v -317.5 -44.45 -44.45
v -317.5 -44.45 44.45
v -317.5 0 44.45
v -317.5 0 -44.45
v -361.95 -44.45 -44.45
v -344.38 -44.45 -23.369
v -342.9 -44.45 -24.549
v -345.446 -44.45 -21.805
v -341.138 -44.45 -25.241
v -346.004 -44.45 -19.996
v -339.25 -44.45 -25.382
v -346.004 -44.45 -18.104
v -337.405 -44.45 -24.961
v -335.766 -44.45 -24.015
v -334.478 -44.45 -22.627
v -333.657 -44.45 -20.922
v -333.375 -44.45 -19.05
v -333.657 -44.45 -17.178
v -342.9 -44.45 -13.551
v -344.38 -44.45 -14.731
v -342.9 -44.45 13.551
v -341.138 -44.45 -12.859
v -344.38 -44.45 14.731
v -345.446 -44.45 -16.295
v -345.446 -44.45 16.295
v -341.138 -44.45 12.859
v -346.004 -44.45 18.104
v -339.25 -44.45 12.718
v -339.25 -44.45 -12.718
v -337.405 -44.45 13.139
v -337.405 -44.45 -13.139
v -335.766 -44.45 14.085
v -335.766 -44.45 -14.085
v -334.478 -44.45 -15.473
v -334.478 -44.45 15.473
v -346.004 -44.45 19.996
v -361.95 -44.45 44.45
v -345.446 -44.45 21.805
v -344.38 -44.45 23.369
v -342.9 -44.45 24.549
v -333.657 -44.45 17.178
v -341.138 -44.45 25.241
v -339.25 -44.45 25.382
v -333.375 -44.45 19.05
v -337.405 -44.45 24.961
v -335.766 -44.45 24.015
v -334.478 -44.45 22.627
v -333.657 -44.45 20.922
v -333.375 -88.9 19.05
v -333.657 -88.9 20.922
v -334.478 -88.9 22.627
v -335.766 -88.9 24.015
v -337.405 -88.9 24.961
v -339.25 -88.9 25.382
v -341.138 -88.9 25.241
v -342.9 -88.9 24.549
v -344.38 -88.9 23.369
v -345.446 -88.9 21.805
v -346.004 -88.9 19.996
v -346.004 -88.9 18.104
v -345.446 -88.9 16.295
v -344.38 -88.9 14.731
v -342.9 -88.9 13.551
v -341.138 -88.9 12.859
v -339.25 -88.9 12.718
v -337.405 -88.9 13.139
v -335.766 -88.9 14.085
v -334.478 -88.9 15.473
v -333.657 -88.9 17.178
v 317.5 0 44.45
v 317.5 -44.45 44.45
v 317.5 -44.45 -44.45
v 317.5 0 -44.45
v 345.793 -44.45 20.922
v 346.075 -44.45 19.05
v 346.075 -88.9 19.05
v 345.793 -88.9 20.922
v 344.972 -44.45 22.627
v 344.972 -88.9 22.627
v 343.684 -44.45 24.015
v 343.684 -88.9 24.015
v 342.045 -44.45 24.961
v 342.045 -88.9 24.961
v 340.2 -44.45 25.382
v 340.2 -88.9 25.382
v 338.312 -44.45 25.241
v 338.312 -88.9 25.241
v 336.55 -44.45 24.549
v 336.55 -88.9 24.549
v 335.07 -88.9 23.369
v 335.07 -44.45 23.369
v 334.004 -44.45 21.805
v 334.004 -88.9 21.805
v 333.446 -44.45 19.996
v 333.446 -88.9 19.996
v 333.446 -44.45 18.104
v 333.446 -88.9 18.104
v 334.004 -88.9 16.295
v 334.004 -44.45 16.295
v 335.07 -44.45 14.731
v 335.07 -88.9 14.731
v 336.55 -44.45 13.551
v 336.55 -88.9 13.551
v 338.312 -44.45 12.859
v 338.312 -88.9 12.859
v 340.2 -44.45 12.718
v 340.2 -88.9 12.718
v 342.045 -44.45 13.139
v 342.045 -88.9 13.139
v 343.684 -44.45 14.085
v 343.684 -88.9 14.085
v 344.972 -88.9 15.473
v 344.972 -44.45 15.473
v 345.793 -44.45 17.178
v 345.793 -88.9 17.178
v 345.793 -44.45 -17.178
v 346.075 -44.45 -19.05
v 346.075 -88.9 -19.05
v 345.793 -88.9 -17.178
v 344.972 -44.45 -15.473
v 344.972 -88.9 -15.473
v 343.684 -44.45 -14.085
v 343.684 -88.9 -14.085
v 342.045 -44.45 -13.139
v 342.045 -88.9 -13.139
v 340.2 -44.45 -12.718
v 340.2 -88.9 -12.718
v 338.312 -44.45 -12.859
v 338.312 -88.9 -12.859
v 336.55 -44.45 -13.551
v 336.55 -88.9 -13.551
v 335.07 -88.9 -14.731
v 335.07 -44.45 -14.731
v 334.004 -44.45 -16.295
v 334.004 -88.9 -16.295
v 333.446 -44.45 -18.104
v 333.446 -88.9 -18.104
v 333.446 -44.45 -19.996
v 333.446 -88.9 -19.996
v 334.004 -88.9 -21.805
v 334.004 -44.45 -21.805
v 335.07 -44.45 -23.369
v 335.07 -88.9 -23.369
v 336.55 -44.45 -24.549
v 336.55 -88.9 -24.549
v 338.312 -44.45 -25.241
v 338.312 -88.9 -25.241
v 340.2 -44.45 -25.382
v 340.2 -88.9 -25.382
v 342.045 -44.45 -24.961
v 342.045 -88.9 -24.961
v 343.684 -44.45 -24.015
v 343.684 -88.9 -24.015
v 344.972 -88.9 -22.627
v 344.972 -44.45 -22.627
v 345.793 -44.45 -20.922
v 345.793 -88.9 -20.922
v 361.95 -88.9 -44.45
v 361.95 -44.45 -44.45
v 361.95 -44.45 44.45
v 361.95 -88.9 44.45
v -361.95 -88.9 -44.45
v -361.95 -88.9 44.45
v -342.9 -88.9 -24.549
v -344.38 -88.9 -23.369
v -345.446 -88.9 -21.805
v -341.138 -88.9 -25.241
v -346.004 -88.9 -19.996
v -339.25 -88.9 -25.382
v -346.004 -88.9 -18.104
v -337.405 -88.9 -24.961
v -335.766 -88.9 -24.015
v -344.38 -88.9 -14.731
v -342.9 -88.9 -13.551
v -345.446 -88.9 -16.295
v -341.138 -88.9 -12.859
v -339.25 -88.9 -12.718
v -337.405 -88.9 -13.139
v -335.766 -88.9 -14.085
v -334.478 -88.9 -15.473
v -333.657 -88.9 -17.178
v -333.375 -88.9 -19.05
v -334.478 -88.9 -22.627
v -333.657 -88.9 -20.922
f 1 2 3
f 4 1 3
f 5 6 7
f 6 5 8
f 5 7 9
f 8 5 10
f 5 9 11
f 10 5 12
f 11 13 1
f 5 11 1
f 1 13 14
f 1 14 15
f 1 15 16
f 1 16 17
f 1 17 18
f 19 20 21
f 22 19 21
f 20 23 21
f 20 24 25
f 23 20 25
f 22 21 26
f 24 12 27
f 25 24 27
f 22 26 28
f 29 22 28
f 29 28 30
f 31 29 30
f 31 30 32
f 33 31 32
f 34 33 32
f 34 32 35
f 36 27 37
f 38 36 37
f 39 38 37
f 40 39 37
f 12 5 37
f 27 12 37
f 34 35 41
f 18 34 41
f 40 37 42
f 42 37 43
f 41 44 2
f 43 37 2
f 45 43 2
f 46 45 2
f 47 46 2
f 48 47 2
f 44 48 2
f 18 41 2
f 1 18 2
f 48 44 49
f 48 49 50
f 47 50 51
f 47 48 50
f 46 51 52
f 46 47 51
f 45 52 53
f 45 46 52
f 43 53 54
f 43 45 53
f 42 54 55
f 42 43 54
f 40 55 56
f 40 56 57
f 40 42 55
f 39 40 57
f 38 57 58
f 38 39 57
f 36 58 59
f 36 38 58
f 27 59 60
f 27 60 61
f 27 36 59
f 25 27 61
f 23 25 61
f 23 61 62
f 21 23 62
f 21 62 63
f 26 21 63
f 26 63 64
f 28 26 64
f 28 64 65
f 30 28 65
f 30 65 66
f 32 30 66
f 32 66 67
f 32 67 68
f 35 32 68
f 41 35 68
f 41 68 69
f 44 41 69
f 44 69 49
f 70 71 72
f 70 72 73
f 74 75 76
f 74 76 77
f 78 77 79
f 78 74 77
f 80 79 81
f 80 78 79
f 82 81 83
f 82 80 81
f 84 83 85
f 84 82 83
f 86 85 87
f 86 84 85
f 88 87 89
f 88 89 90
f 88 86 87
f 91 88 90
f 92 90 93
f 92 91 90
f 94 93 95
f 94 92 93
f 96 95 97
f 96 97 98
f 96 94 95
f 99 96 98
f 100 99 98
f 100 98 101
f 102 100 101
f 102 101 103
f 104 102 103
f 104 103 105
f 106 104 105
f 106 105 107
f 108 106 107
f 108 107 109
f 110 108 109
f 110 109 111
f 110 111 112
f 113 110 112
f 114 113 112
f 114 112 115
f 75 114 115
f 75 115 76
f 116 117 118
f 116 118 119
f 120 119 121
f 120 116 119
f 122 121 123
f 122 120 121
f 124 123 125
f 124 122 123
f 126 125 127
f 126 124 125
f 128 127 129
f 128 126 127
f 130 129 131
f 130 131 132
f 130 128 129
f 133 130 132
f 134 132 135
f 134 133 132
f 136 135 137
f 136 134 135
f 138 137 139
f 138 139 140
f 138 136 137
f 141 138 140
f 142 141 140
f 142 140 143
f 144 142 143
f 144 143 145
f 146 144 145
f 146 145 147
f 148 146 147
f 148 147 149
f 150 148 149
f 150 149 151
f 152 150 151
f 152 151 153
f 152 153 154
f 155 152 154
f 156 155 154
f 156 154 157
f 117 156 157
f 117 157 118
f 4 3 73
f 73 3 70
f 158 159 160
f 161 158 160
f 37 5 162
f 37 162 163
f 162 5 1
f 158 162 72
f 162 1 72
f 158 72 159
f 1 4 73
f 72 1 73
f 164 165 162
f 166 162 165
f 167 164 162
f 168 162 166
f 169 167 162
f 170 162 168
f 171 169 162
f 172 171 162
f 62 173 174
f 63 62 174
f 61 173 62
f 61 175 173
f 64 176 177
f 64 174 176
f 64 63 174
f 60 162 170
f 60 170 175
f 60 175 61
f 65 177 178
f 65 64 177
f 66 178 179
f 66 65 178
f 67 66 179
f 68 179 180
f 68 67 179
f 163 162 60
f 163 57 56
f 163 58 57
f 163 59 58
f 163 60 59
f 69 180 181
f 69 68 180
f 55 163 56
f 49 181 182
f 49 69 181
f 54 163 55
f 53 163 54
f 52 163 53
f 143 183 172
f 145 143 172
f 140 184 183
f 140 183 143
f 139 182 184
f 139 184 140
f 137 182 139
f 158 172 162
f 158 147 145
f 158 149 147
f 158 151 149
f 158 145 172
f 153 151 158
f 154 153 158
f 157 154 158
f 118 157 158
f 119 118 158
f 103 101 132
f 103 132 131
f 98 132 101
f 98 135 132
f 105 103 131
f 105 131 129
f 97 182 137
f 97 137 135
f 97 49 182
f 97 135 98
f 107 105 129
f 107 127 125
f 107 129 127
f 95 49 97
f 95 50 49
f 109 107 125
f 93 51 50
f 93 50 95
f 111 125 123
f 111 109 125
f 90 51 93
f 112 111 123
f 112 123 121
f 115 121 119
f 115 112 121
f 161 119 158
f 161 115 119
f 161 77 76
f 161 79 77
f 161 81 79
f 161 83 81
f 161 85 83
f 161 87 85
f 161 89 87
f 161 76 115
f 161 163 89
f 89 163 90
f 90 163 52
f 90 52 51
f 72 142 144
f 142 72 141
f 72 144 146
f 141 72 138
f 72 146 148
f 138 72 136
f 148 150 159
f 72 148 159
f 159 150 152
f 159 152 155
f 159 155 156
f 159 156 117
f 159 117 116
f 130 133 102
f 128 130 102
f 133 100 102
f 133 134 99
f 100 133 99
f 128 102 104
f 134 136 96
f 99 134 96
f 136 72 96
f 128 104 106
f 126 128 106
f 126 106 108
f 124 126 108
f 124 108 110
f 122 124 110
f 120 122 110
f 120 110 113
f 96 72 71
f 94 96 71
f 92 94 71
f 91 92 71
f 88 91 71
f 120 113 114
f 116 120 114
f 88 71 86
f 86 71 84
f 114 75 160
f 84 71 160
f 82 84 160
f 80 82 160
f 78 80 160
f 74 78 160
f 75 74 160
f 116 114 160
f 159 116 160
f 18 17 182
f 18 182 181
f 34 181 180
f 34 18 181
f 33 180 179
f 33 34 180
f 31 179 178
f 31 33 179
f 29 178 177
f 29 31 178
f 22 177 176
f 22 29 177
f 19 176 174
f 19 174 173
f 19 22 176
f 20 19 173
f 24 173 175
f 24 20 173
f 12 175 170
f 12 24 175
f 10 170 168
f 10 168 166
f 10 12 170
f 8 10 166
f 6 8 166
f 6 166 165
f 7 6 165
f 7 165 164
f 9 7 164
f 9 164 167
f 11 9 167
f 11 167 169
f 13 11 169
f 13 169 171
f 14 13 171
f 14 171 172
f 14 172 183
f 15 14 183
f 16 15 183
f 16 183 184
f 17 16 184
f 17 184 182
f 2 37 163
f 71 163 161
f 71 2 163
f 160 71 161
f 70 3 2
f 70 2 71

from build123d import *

# Parameters (mm, degrees)
F0_W     = 723.9
F0_H     = 88.9
F0_R     = 6.35
F1_DEPTH = 88.9
F2_W     = 44.45
F2_H     = 44.45
F3_DEPTH = 101.6


with BuildPart() as f1:
    # F0 (on Front) → F1 (new body)
    with BuildSketch(Plane.XZ):
        Rectangle(F0_W, F0_H)
        with Locations((-339.725, -19.05)):
            Circle(F0_R, mode=Mode.SUBTRACT)
        with Locations((339.725, -19.05)):
            Circle(F0_R, mode=Mode.SUBTRACT)
        with Locations((-339.725, 19.05)):
            Circle(F0_R, mode=Mode.SUBTRACT)
        with Locations((339.725, 19.05)):
            Circle(F0_R, mode=Mode.SUBTRACT)
    extrude(amount=F1_DEPTH)

    # F2 (on face) → F3 (cut)
    with BuildSketch(Plane.XY.offset(44.45)):
        with Locations((-339.725, -22.225)):
            Rectangle(F2_W, F2_H)
        with Locations((339.725, -22.225)):
            Rectangle(F2_W, F2_H)
    extrude(amount=-F3_DEPTH, mode=Mode.SUBTRACT)


solid = f1.part
